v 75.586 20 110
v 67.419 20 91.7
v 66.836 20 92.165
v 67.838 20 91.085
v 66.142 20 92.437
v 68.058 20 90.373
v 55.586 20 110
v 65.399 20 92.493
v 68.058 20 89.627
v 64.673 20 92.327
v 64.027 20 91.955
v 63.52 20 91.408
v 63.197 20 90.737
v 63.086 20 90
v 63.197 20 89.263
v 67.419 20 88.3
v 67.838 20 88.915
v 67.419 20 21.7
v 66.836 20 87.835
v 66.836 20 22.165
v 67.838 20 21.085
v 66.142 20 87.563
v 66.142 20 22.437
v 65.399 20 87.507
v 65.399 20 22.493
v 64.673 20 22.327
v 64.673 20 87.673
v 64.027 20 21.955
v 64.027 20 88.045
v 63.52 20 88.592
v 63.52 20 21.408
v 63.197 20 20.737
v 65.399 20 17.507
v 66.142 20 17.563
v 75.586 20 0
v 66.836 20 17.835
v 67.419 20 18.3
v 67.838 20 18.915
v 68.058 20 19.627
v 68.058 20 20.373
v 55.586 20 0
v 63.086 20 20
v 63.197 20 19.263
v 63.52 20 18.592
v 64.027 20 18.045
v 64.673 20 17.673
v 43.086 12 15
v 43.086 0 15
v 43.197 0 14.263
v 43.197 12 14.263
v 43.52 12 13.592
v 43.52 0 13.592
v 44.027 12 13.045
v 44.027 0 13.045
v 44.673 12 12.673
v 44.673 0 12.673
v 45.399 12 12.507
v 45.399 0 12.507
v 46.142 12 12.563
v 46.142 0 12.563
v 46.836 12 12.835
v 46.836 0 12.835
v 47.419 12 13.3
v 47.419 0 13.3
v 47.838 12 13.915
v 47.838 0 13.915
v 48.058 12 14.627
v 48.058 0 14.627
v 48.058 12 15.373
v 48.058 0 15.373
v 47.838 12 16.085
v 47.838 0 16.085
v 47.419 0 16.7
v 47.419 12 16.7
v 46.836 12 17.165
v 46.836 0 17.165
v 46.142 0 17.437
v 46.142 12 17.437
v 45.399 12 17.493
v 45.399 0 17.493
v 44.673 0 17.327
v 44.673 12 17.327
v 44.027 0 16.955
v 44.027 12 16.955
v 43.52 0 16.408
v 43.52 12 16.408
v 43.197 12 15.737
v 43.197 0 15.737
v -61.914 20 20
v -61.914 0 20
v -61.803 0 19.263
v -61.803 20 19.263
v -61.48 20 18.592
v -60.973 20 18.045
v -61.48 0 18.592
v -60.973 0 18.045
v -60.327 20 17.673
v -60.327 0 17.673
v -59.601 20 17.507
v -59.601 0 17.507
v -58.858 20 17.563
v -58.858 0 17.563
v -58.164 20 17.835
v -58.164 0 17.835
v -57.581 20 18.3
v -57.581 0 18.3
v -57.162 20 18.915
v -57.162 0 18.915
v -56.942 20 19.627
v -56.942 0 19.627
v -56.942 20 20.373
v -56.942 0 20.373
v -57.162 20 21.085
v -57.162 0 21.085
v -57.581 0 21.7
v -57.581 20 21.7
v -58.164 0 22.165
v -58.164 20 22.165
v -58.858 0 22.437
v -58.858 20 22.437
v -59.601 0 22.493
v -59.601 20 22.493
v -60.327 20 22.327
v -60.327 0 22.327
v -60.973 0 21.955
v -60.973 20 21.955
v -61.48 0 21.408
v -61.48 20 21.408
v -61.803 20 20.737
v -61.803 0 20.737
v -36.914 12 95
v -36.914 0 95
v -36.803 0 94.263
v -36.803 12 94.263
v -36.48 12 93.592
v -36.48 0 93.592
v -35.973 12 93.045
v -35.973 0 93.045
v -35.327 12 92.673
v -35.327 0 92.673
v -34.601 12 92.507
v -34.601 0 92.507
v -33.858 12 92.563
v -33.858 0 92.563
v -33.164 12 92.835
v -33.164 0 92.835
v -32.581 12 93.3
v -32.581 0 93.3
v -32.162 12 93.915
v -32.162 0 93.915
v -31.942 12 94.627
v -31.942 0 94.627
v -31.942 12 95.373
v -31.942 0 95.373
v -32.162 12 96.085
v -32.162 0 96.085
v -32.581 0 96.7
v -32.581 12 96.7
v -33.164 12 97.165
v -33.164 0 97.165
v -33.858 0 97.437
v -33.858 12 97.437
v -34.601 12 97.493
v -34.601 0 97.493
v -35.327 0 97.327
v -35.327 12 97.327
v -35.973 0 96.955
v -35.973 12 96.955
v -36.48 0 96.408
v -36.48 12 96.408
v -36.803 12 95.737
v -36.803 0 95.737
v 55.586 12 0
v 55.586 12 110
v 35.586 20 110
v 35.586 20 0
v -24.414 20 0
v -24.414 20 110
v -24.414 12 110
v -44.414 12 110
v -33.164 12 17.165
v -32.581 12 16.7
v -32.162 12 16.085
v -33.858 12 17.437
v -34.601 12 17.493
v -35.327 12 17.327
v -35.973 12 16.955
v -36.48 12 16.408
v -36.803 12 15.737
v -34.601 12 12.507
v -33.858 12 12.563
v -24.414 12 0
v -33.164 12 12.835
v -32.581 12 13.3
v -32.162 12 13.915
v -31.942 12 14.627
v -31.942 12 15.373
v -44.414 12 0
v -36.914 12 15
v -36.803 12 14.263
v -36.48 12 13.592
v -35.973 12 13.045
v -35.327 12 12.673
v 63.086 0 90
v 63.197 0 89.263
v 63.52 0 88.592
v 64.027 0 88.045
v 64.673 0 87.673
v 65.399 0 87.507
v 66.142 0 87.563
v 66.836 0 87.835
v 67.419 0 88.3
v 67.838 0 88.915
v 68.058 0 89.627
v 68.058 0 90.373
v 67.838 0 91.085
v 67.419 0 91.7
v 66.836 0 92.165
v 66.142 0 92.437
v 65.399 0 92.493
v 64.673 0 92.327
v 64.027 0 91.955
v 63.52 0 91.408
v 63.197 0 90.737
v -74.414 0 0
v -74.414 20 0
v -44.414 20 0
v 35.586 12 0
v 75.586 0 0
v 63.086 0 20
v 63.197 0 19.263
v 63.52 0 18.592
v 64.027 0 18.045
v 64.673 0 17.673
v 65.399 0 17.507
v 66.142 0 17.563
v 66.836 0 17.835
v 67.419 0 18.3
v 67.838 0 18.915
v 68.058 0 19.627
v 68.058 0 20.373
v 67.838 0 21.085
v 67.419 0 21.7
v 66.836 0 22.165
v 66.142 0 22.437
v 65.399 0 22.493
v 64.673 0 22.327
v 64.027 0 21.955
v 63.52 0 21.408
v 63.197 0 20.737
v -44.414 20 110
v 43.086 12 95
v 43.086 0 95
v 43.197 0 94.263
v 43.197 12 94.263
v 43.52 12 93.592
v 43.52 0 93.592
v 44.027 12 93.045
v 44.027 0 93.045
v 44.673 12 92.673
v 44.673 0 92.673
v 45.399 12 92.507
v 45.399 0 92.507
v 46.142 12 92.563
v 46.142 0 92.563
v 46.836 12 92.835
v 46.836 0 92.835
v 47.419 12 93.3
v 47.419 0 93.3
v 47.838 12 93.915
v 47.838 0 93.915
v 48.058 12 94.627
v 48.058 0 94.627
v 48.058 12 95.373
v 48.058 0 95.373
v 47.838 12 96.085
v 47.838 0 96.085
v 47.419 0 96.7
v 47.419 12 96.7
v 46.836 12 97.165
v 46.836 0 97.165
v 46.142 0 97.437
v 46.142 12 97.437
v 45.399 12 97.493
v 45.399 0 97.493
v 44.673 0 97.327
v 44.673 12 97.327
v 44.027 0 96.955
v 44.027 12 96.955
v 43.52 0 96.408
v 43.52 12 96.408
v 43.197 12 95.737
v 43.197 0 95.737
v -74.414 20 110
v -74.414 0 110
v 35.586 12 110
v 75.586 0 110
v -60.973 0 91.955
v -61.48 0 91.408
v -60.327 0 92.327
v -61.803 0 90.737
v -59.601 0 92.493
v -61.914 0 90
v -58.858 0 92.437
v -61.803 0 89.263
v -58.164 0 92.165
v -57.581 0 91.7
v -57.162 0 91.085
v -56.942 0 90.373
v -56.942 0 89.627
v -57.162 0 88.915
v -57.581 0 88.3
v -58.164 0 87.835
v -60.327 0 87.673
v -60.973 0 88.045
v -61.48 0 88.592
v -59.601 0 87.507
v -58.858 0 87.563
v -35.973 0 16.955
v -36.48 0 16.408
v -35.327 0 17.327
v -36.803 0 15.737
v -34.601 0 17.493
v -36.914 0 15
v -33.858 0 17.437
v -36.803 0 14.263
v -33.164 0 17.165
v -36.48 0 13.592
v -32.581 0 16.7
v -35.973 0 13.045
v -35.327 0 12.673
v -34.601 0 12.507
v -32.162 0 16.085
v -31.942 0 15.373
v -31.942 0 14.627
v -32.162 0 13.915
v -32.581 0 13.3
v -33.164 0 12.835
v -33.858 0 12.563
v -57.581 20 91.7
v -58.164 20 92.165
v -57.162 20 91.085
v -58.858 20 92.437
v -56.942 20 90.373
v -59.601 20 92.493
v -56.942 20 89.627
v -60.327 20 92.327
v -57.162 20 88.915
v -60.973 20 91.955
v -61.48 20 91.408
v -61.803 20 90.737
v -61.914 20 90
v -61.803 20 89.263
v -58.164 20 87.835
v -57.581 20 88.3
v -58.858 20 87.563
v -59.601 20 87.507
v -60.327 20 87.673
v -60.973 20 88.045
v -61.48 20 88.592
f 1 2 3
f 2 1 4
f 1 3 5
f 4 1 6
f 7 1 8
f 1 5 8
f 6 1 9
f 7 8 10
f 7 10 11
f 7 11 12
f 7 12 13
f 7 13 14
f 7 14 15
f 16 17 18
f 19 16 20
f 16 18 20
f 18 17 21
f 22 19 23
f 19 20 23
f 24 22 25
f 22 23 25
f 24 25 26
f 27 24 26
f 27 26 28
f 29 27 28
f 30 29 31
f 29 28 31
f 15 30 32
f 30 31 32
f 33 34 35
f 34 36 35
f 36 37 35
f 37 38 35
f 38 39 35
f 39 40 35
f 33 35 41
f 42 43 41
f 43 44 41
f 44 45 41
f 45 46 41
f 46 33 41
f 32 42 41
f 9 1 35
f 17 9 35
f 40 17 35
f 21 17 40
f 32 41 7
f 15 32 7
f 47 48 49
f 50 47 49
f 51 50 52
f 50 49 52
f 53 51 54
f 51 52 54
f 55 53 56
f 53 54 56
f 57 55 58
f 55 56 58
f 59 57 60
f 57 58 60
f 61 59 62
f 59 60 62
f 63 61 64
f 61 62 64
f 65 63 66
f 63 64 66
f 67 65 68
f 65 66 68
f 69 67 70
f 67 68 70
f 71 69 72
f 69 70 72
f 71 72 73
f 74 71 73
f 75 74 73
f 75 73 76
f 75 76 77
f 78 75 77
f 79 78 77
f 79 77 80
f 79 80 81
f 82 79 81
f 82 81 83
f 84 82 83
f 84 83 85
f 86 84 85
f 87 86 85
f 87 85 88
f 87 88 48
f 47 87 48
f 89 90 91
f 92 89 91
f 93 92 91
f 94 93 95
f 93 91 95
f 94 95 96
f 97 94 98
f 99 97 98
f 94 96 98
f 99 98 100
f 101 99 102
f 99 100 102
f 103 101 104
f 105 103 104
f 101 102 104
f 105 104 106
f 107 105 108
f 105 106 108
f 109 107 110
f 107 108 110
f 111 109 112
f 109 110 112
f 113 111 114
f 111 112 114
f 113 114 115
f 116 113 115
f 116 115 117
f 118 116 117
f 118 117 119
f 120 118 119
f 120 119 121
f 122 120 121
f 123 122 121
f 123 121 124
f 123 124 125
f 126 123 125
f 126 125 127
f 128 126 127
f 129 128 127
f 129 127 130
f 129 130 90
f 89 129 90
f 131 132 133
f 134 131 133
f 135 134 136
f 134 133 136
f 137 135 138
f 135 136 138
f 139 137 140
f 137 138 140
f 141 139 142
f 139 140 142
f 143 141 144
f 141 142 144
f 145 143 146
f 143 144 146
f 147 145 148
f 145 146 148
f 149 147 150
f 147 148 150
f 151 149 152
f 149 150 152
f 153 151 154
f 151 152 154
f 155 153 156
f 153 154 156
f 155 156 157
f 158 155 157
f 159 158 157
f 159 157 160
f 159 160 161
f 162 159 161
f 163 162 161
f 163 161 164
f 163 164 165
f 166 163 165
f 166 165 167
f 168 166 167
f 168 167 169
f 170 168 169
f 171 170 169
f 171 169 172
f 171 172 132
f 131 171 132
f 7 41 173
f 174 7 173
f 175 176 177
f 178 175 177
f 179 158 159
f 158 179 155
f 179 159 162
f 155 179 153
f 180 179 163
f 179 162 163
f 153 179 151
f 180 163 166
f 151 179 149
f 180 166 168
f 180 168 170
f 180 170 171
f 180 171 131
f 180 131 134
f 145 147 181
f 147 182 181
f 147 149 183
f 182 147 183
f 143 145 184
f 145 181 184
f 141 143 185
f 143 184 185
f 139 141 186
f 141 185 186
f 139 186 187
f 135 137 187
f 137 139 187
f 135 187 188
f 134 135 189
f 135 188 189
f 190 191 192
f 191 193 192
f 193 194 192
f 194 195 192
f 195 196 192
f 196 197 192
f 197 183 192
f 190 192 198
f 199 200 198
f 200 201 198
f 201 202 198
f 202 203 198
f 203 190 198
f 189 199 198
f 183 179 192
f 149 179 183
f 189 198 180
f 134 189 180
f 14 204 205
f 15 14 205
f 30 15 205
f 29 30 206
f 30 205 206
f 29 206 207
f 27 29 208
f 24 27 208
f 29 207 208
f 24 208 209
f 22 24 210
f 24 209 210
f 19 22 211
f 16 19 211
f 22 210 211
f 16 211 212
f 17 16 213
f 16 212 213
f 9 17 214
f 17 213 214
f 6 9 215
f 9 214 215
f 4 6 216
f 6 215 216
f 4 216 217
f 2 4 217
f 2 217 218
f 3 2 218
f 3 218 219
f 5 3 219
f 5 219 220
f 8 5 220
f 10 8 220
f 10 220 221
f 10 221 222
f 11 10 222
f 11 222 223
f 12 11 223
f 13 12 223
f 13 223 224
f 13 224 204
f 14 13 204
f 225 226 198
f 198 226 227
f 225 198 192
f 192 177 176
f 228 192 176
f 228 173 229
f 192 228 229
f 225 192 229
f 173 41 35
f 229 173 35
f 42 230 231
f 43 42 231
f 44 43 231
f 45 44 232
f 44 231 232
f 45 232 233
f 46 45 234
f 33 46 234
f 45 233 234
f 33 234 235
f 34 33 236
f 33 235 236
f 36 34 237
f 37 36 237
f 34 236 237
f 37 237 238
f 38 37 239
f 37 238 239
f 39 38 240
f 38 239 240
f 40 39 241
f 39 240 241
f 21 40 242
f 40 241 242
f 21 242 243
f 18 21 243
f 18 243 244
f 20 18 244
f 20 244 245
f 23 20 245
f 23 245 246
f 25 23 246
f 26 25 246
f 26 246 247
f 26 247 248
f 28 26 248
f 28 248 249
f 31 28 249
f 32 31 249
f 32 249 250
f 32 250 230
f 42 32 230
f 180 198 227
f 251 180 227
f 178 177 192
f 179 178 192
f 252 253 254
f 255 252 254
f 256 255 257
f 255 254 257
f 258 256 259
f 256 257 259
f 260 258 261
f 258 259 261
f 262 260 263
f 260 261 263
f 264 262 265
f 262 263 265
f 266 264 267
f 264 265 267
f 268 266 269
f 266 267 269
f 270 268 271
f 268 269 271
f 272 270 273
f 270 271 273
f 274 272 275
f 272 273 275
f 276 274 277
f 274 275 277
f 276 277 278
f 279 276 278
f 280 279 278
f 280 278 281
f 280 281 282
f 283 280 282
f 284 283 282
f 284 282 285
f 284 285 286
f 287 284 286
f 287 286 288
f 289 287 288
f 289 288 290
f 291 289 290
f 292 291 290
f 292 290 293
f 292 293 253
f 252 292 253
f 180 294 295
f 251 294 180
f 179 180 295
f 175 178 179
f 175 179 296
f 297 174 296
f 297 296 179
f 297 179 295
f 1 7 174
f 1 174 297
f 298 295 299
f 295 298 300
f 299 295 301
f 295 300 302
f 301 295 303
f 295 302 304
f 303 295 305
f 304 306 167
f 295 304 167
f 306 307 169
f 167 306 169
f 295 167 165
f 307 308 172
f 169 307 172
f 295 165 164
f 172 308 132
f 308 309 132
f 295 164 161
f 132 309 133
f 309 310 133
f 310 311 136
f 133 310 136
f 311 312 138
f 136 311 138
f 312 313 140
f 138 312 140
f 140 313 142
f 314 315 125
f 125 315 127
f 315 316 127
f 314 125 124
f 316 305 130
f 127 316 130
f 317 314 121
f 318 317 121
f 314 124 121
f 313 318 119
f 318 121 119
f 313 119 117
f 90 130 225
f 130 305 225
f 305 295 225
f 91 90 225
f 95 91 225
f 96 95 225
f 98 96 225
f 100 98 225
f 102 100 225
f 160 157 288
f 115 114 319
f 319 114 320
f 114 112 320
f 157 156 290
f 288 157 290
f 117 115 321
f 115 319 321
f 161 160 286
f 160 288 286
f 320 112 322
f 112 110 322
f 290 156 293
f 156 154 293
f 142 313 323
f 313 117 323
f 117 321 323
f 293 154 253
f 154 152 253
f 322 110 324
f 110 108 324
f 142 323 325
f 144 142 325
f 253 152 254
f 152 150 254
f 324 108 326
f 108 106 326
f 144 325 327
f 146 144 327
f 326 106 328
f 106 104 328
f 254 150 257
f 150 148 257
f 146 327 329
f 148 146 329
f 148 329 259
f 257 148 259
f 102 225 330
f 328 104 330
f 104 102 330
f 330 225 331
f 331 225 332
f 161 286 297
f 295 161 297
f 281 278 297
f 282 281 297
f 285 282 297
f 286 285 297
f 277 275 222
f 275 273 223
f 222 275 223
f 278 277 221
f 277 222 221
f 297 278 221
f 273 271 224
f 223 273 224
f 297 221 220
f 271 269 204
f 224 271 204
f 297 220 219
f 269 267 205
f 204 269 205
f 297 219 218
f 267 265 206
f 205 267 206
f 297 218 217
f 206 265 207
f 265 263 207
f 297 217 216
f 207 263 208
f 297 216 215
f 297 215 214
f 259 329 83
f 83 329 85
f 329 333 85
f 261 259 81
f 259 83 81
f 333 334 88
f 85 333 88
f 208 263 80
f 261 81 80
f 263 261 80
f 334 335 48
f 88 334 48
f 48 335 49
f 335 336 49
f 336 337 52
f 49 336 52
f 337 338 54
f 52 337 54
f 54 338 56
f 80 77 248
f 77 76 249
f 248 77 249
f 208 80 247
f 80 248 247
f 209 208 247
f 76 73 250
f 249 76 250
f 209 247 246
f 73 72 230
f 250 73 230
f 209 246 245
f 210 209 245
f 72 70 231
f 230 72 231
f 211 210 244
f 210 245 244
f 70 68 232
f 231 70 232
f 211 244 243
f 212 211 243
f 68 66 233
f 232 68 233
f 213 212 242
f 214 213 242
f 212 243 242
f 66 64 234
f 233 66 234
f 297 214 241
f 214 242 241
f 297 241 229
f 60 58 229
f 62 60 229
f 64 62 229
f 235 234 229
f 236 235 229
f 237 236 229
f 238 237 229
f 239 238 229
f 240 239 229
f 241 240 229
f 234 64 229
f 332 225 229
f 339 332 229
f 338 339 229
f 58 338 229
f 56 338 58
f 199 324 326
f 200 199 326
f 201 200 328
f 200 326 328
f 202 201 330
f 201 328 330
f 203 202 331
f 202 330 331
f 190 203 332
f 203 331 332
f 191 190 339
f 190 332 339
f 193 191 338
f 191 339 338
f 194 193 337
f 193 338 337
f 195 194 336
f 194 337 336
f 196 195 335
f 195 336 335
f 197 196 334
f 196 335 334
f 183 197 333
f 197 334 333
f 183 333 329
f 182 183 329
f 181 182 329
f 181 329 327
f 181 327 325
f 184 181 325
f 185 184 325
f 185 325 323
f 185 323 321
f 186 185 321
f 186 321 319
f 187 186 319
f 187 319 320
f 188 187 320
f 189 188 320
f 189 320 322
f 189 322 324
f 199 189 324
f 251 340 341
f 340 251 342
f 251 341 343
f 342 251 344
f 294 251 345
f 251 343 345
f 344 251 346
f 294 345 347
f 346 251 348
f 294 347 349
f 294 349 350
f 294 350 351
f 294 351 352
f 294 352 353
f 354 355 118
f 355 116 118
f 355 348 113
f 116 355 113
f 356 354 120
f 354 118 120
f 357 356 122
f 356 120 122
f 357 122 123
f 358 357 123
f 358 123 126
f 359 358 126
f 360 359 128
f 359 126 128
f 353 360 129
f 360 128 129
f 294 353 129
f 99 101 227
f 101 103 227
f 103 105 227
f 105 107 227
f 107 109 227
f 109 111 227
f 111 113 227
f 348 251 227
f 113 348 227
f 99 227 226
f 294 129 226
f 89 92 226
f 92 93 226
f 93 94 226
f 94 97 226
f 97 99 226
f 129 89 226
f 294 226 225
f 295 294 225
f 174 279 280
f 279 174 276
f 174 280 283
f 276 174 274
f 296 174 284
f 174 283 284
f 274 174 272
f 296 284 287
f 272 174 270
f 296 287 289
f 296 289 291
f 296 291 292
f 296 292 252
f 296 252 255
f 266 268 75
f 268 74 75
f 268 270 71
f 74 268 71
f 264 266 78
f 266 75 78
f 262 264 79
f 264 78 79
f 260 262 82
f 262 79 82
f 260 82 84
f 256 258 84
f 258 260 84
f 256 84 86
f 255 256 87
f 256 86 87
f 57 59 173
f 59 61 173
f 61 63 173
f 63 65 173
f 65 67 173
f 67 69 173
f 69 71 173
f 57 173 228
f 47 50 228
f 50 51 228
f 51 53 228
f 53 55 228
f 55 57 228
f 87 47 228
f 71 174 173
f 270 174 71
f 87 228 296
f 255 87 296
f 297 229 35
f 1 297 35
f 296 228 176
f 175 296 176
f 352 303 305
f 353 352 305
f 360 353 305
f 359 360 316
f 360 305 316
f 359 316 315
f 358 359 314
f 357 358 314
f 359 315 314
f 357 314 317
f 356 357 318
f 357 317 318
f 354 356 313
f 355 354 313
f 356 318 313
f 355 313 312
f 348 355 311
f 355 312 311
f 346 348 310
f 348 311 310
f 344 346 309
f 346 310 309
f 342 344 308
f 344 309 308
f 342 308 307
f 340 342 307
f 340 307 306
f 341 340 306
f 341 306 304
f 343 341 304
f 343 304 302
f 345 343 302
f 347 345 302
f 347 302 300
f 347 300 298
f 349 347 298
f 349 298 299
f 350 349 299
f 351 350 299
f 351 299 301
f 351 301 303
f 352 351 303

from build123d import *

# Parameters (mm, degrees)
BOSS_EXTRUDE1_DEPTH       = 110
F_5_0MM_DOWEL_HOLE1_D     = 5
F_5_0MM_DOWEL_HOLE2_D     = 5
F_5_0MM_DOWEL_HOLE2_DEPTH = 12


with BuildPart() as part:
    # Sketch1 → Boss-Extrude1 (new body)
    with BuildSketch(Plane.XY):
        Polygon((-74.4140625, 0), (75.5859375, 0), (75.5859375, 20), (55.5859375, 20), (55.5859375, 12), (35.5859375, 12), (35.5859375, 20), (-24.4140625, 20), (-24.4140625, 12), (-44.4140625, 12), (-44.4140625, 20), (-74.4140625, 20), align=None)
    extrude(amount=BOSS_EXTRUDE1_DEPTH)

    # Ø5.0mm Dowel Hole1 (through all)
    with Locations(Plane(origin=(-59.4140625, 20, 20), x_dir=(1, 0, 0), z_dir=(0, 1, 0))):
        with Locations((0, 0), (0, -70), (125, 0), (125, -70)):
            Hole(F_5_0MM_DOWEL_HOLE1_D / 2)

    # Ø5.0mm Dowel Hole2
    with Locations(Plane(origin=(-34.4140625, 12, 15), x_dir=(1, 0, 0), z_dir=(0, 1, 0))):
        with Locations((0, 0), (0, -80), (80, 0), (80, -80)):
            Hole(F_5_0MM_DOWEL_HOLE2_D / 2, depth=F_5_0MM_DOWEL_HOLE2_DEPTH)


solid = part.part
